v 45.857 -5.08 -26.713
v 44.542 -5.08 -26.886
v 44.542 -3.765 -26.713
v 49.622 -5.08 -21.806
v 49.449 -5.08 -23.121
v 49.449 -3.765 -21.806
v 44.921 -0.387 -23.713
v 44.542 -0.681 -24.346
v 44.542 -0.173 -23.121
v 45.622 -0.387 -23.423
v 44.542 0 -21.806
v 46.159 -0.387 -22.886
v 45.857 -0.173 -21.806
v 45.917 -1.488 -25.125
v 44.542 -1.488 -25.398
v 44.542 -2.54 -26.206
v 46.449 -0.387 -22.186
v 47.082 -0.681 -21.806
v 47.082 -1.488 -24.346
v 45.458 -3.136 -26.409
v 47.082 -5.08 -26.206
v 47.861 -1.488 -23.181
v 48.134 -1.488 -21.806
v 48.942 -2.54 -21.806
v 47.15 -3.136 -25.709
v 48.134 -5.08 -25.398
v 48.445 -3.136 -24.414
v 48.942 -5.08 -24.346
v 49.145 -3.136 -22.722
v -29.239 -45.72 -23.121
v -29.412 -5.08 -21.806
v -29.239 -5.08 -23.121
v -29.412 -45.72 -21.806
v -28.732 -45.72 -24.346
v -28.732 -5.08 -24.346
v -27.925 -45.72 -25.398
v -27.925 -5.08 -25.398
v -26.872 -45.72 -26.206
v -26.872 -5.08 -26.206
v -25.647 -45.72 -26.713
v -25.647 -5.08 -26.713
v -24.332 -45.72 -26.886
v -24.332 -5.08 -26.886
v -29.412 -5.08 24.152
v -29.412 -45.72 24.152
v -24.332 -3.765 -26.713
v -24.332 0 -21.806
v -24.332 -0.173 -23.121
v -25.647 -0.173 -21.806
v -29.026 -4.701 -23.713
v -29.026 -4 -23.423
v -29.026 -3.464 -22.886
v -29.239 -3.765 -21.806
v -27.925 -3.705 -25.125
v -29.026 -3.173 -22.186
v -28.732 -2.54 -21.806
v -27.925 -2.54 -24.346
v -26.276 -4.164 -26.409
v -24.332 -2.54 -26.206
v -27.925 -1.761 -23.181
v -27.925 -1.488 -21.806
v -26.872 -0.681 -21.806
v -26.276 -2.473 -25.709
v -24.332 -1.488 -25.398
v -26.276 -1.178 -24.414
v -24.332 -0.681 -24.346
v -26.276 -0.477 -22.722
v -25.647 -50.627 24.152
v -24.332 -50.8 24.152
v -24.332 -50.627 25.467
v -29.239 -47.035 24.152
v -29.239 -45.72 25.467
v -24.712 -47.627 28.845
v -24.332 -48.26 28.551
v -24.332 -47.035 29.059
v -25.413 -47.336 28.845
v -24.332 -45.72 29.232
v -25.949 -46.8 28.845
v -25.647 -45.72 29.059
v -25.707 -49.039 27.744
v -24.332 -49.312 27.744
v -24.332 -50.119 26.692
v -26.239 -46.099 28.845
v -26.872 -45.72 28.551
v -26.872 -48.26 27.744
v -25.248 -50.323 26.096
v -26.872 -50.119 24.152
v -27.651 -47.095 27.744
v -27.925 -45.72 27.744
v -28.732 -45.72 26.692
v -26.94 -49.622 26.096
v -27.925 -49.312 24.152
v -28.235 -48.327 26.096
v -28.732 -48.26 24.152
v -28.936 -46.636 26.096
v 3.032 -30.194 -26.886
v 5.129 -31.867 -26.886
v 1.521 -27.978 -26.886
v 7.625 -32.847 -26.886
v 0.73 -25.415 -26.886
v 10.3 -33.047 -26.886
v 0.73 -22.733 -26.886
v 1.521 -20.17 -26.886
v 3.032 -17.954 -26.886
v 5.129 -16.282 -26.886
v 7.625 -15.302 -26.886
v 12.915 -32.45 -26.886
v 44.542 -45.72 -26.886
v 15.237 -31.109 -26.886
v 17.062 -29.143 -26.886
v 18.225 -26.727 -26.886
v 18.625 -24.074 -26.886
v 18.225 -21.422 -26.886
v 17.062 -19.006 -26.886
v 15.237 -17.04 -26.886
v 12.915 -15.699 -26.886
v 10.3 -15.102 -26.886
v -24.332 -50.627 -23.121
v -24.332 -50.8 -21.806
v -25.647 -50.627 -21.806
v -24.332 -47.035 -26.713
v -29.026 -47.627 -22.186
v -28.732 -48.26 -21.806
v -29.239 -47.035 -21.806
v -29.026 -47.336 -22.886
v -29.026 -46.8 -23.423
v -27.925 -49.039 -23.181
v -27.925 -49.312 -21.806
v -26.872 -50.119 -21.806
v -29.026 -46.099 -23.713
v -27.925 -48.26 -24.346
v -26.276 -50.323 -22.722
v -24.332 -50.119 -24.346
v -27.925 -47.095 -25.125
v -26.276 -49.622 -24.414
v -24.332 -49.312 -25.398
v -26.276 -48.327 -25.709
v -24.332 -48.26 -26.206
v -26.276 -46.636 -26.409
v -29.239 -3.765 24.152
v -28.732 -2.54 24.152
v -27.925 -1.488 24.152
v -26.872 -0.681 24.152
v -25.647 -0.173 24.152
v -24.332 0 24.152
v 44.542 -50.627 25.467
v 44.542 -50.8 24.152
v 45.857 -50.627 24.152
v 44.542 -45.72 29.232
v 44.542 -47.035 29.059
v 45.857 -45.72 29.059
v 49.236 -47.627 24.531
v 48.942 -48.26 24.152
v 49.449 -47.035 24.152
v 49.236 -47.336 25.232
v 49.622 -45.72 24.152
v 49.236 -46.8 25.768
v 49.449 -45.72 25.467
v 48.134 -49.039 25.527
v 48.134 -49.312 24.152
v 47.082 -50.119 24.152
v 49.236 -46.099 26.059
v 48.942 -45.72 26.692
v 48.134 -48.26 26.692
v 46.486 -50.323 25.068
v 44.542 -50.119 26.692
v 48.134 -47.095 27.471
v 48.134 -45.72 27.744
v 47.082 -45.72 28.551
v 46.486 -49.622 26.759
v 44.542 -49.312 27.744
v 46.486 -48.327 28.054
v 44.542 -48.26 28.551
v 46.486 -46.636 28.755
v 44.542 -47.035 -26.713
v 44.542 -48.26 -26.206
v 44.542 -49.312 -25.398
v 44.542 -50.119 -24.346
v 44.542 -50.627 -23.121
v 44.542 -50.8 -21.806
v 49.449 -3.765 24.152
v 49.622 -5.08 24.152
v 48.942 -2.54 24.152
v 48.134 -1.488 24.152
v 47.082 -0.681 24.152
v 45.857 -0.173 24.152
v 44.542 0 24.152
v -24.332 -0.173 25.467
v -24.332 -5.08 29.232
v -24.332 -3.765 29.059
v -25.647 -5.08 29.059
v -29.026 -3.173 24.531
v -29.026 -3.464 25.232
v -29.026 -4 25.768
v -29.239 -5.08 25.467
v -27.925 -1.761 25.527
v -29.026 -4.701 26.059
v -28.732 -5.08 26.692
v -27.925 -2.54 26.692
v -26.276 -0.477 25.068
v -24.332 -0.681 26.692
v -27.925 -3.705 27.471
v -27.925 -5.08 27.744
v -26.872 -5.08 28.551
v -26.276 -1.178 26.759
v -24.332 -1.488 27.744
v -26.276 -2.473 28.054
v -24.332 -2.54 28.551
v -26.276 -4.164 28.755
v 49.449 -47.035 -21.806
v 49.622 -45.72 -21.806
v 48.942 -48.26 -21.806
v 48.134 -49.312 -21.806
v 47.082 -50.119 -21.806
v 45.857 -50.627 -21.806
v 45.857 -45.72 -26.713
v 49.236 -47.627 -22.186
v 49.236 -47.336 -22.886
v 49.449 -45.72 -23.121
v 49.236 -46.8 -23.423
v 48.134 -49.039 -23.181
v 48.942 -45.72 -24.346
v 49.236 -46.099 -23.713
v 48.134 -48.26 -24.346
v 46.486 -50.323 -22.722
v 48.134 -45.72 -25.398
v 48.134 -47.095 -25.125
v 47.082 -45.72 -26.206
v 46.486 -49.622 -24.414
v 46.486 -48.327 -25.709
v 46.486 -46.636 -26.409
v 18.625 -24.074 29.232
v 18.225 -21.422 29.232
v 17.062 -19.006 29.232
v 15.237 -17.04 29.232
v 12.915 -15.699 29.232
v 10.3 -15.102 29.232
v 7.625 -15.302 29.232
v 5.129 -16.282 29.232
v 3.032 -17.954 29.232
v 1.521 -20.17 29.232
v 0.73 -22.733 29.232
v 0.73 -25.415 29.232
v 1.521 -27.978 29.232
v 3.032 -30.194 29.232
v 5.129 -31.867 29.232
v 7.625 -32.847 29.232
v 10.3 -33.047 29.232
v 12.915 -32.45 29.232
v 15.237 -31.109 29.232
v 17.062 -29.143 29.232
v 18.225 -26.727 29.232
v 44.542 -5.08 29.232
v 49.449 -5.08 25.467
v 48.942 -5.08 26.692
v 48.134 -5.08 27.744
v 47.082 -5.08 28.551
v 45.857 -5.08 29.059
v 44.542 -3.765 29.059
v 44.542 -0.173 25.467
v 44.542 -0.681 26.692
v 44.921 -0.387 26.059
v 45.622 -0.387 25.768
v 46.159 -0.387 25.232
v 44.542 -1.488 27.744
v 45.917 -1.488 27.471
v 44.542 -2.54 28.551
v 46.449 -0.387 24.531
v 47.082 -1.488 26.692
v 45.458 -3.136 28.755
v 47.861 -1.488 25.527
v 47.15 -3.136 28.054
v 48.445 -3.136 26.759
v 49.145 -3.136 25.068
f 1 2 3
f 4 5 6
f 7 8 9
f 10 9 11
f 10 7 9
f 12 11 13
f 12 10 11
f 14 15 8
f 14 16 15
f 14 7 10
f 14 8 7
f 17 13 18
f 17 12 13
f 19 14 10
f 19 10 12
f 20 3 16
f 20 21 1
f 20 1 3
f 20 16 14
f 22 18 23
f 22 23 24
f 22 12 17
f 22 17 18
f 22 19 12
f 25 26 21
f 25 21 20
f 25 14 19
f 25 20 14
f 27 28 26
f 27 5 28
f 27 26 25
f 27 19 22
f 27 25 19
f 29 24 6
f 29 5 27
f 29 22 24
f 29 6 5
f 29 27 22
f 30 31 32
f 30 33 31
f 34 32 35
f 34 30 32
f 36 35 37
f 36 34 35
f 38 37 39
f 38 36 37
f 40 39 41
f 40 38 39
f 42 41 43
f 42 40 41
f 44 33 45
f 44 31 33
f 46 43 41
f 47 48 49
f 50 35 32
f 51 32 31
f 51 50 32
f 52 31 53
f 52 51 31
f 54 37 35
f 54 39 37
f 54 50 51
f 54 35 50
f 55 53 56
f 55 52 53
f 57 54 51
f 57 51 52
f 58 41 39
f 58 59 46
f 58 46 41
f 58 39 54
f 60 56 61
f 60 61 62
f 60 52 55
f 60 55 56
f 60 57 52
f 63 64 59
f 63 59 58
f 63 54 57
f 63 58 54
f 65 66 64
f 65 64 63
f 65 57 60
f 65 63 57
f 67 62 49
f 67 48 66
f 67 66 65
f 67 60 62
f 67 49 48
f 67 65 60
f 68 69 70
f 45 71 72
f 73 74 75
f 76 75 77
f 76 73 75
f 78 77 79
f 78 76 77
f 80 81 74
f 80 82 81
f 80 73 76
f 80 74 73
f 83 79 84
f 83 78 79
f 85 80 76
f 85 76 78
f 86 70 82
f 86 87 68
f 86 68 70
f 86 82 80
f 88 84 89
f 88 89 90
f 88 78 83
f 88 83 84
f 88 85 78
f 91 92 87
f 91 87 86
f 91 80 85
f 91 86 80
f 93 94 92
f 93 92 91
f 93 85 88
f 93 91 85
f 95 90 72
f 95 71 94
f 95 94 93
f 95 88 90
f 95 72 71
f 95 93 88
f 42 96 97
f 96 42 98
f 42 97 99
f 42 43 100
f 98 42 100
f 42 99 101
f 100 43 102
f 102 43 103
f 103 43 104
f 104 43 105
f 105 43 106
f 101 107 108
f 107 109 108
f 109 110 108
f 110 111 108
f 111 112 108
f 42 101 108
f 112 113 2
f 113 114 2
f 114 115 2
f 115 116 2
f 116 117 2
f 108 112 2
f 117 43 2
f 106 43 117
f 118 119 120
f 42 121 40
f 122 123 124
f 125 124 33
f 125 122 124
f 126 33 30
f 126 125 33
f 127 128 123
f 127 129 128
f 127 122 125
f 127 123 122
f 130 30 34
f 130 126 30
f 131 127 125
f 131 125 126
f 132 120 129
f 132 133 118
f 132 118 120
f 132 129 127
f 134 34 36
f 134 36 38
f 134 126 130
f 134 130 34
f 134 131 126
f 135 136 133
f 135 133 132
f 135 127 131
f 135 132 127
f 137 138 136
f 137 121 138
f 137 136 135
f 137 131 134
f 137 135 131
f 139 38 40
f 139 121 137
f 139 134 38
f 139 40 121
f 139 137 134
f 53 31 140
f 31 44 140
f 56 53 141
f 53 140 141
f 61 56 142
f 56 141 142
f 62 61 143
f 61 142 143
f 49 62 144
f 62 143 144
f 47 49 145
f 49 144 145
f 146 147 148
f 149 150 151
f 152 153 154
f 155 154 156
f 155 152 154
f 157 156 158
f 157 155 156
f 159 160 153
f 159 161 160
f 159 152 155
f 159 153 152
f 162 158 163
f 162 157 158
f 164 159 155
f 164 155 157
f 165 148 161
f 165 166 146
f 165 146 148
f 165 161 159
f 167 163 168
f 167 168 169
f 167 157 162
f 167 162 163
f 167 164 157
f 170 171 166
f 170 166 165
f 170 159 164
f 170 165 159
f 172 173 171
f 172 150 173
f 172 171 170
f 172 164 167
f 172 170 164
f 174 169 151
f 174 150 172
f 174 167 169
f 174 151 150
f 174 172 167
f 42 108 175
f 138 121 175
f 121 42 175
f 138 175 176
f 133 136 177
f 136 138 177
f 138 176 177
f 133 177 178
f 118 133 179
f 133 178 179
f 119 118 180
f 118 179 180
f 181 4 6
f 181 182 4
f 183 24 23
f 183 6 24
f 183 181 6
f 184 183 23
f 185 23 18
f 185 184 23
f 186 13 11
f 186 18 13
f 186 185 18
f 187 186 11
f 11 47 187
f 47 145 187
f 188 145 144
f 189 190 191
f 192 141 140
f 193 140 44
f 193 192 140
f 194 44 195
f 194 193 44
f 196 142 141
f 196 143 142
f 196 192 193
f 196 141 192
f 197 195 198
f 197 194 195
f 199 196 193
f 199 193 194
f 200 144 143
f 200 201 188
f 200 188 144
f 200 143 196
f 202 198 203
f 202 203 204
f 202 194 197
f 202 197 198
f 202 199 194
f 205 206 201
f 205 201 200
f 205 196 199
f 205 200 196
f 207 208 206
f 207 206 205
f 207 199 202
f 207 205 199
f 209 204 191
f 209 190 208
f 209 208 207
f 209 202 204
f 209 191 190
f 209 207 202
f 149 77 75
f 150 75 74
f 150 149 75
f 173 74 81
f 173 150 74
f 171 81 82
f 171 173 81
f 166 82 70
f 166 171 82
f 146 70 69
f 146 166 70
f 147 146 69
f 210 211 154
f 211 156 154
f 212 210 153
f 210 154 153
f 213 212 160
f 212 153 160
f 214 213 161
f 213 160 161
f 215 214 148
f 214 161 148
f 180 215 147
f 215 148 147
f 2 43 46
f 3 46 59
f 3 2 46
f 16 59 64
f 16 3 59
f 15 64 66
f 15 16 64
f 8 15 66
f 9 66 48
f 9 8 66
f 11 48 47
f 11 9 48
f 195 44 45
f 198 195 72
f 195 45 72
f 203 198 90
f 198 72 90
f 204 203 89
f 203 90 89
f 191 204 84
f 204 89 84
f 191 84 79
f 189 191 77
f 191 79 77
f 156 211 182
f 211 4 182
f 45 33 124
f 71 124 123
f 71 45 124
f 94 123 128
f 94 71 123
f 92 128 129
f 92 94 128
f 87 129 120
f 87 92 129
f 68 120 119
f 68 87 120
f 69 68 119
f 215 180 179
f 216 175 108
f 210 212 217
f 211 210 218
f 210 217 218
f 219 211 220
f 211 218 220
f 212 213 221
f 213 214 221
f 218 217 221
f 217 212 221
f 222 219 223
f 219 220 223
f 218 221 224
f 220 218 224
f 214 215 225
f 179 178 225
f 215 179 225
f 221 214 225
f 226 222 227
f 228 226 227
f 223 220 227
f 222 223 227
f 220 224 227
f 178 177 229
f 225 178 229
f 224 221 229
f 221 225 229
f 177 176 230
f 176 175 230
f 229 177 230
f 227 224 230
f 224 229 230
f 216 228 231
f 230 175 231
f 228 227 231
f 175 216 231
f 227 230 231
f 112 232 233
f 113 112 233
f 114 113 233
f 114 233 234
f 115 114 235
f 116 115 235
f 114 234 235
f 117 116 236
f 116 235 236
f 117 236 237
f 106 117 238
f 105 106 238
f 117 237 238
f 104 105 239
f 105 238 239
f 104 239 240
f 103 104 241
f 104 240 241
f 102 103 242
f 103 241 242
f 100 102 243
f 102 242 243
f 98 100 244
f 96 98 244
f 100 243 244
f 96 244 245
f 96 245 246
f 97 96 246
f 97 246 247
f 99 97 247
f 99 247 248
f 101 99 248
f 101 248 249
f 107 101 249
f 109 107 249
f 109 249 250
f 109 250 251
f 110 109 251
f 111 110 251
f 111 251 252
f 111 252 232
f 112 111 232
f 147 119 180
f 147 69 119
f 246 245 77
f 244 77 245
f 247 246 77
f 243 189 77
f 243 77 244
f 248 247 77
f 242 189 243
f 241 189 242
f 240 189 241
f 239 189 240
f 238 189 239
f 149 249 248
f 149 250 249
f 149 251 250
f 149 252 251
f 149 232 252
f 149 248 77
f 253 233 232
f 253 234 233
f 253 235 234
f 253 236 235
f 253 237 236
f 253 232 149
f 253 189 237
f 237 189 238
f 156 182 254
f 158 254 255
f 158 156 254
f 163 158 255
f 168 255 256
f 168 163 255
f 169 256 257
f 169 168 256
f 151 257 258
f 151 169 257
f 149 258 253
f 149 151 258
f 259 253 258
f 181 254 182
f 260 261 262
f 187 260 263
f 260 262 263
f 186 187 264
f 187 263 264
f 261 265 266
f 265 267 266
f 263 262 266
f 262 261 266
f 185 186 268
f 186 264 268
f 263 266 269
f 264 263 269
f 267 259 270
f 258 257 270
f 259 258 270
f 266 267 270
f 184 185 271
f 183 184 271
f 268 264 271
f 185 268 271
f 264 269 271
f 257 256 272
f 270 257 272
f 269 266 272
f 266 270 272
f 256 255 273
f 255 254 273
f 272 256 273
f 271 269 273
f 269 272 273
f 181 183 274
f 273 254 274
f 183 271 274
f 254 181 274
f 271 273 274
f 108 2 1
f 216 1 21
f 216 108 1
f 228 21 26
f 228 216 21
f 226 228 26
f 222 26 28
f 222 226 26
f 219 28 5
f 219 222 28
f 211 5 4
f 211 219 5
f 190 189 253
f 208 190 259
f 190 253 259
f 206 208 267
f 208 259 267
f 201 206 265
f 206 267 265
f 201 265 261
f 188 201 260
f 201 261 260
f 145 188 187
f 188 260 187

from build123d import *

# Parameters (mm, degrees)
F0_W     = 79.0346935391
F0_H     = 56.1182498932
F1_DEPTH = 50.8
F2_R     = 5.08
F3_R     = 8.9977946324
F4_DEPTH = 56.1192498932


with BuildPart() as f1:
    # F0 (on Front) → F1 (new body)
    with BuildSketch(Plane.XZ):
        with Locations((10.1048909128, 1.1728554964)):
            Rectangle(F0_W, F0_H)
    extrude(amount=F1_DEPTH)

    # F2
    f2_edges = [f1.edges().sort_by_distance(p)[0] for p in [
        (10.104891, -50.8, -26.886269),
        (-29.412456, -50.8, 1.172855),
        (10.104891, -50.8, 29.23198),
        (49.622238, -50.8, 1.172855),
        (49.622238, -25.4, -26.886269),
        (10.104891, 0, -26.886269),
        (-29.412456, -25.4, -26.886269),
        (49.622238, -25.4, 29.23198),
        (10.104891, 0, 29.23198),
        (-29.412456, 0, 1.172855),
        (49.622238, 0, 1.172855),
        (-29.412456, -25.4, 29.23198),
    ]]
    fillet(f2_edges, radius=F2_R)

    # F3 (on face) → F4 (cut, through all)
    with BuildSketch(Plane.XY.offset(29.231980443)):
        with Locations((9.6274446696, -24.0743868053)):
            Circle(F3_R)
    extrude(amount=-F4_DEPTH, mode=Mode.SUBTRACT)


solid = f1.part
